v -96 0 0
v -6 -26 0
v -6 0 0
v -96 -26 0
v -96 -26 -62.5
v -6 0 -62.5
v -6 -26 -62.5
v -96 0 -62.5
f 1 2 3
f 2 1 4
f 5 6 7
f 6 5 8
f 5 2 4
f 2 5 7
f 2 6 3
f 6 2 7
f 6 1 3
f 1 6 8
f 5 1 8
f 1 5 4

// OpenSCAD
width_from_pillar = 90;
left_edge_from_wall = 96;
depth_from_tile = 26;
front_edge_from_wall = 28;
height = 62.5;

module electric_box()
{
    color([0.6,0.6,0.6,0.5]) 
    translate([-left_edge_from_wall,-depth_from_tile,-height]) 
    {
        color("green")
            cube ([width_from_pillar, 
                depth_from_tile, height], 
                    center = false);
    }
}

electric_box();
